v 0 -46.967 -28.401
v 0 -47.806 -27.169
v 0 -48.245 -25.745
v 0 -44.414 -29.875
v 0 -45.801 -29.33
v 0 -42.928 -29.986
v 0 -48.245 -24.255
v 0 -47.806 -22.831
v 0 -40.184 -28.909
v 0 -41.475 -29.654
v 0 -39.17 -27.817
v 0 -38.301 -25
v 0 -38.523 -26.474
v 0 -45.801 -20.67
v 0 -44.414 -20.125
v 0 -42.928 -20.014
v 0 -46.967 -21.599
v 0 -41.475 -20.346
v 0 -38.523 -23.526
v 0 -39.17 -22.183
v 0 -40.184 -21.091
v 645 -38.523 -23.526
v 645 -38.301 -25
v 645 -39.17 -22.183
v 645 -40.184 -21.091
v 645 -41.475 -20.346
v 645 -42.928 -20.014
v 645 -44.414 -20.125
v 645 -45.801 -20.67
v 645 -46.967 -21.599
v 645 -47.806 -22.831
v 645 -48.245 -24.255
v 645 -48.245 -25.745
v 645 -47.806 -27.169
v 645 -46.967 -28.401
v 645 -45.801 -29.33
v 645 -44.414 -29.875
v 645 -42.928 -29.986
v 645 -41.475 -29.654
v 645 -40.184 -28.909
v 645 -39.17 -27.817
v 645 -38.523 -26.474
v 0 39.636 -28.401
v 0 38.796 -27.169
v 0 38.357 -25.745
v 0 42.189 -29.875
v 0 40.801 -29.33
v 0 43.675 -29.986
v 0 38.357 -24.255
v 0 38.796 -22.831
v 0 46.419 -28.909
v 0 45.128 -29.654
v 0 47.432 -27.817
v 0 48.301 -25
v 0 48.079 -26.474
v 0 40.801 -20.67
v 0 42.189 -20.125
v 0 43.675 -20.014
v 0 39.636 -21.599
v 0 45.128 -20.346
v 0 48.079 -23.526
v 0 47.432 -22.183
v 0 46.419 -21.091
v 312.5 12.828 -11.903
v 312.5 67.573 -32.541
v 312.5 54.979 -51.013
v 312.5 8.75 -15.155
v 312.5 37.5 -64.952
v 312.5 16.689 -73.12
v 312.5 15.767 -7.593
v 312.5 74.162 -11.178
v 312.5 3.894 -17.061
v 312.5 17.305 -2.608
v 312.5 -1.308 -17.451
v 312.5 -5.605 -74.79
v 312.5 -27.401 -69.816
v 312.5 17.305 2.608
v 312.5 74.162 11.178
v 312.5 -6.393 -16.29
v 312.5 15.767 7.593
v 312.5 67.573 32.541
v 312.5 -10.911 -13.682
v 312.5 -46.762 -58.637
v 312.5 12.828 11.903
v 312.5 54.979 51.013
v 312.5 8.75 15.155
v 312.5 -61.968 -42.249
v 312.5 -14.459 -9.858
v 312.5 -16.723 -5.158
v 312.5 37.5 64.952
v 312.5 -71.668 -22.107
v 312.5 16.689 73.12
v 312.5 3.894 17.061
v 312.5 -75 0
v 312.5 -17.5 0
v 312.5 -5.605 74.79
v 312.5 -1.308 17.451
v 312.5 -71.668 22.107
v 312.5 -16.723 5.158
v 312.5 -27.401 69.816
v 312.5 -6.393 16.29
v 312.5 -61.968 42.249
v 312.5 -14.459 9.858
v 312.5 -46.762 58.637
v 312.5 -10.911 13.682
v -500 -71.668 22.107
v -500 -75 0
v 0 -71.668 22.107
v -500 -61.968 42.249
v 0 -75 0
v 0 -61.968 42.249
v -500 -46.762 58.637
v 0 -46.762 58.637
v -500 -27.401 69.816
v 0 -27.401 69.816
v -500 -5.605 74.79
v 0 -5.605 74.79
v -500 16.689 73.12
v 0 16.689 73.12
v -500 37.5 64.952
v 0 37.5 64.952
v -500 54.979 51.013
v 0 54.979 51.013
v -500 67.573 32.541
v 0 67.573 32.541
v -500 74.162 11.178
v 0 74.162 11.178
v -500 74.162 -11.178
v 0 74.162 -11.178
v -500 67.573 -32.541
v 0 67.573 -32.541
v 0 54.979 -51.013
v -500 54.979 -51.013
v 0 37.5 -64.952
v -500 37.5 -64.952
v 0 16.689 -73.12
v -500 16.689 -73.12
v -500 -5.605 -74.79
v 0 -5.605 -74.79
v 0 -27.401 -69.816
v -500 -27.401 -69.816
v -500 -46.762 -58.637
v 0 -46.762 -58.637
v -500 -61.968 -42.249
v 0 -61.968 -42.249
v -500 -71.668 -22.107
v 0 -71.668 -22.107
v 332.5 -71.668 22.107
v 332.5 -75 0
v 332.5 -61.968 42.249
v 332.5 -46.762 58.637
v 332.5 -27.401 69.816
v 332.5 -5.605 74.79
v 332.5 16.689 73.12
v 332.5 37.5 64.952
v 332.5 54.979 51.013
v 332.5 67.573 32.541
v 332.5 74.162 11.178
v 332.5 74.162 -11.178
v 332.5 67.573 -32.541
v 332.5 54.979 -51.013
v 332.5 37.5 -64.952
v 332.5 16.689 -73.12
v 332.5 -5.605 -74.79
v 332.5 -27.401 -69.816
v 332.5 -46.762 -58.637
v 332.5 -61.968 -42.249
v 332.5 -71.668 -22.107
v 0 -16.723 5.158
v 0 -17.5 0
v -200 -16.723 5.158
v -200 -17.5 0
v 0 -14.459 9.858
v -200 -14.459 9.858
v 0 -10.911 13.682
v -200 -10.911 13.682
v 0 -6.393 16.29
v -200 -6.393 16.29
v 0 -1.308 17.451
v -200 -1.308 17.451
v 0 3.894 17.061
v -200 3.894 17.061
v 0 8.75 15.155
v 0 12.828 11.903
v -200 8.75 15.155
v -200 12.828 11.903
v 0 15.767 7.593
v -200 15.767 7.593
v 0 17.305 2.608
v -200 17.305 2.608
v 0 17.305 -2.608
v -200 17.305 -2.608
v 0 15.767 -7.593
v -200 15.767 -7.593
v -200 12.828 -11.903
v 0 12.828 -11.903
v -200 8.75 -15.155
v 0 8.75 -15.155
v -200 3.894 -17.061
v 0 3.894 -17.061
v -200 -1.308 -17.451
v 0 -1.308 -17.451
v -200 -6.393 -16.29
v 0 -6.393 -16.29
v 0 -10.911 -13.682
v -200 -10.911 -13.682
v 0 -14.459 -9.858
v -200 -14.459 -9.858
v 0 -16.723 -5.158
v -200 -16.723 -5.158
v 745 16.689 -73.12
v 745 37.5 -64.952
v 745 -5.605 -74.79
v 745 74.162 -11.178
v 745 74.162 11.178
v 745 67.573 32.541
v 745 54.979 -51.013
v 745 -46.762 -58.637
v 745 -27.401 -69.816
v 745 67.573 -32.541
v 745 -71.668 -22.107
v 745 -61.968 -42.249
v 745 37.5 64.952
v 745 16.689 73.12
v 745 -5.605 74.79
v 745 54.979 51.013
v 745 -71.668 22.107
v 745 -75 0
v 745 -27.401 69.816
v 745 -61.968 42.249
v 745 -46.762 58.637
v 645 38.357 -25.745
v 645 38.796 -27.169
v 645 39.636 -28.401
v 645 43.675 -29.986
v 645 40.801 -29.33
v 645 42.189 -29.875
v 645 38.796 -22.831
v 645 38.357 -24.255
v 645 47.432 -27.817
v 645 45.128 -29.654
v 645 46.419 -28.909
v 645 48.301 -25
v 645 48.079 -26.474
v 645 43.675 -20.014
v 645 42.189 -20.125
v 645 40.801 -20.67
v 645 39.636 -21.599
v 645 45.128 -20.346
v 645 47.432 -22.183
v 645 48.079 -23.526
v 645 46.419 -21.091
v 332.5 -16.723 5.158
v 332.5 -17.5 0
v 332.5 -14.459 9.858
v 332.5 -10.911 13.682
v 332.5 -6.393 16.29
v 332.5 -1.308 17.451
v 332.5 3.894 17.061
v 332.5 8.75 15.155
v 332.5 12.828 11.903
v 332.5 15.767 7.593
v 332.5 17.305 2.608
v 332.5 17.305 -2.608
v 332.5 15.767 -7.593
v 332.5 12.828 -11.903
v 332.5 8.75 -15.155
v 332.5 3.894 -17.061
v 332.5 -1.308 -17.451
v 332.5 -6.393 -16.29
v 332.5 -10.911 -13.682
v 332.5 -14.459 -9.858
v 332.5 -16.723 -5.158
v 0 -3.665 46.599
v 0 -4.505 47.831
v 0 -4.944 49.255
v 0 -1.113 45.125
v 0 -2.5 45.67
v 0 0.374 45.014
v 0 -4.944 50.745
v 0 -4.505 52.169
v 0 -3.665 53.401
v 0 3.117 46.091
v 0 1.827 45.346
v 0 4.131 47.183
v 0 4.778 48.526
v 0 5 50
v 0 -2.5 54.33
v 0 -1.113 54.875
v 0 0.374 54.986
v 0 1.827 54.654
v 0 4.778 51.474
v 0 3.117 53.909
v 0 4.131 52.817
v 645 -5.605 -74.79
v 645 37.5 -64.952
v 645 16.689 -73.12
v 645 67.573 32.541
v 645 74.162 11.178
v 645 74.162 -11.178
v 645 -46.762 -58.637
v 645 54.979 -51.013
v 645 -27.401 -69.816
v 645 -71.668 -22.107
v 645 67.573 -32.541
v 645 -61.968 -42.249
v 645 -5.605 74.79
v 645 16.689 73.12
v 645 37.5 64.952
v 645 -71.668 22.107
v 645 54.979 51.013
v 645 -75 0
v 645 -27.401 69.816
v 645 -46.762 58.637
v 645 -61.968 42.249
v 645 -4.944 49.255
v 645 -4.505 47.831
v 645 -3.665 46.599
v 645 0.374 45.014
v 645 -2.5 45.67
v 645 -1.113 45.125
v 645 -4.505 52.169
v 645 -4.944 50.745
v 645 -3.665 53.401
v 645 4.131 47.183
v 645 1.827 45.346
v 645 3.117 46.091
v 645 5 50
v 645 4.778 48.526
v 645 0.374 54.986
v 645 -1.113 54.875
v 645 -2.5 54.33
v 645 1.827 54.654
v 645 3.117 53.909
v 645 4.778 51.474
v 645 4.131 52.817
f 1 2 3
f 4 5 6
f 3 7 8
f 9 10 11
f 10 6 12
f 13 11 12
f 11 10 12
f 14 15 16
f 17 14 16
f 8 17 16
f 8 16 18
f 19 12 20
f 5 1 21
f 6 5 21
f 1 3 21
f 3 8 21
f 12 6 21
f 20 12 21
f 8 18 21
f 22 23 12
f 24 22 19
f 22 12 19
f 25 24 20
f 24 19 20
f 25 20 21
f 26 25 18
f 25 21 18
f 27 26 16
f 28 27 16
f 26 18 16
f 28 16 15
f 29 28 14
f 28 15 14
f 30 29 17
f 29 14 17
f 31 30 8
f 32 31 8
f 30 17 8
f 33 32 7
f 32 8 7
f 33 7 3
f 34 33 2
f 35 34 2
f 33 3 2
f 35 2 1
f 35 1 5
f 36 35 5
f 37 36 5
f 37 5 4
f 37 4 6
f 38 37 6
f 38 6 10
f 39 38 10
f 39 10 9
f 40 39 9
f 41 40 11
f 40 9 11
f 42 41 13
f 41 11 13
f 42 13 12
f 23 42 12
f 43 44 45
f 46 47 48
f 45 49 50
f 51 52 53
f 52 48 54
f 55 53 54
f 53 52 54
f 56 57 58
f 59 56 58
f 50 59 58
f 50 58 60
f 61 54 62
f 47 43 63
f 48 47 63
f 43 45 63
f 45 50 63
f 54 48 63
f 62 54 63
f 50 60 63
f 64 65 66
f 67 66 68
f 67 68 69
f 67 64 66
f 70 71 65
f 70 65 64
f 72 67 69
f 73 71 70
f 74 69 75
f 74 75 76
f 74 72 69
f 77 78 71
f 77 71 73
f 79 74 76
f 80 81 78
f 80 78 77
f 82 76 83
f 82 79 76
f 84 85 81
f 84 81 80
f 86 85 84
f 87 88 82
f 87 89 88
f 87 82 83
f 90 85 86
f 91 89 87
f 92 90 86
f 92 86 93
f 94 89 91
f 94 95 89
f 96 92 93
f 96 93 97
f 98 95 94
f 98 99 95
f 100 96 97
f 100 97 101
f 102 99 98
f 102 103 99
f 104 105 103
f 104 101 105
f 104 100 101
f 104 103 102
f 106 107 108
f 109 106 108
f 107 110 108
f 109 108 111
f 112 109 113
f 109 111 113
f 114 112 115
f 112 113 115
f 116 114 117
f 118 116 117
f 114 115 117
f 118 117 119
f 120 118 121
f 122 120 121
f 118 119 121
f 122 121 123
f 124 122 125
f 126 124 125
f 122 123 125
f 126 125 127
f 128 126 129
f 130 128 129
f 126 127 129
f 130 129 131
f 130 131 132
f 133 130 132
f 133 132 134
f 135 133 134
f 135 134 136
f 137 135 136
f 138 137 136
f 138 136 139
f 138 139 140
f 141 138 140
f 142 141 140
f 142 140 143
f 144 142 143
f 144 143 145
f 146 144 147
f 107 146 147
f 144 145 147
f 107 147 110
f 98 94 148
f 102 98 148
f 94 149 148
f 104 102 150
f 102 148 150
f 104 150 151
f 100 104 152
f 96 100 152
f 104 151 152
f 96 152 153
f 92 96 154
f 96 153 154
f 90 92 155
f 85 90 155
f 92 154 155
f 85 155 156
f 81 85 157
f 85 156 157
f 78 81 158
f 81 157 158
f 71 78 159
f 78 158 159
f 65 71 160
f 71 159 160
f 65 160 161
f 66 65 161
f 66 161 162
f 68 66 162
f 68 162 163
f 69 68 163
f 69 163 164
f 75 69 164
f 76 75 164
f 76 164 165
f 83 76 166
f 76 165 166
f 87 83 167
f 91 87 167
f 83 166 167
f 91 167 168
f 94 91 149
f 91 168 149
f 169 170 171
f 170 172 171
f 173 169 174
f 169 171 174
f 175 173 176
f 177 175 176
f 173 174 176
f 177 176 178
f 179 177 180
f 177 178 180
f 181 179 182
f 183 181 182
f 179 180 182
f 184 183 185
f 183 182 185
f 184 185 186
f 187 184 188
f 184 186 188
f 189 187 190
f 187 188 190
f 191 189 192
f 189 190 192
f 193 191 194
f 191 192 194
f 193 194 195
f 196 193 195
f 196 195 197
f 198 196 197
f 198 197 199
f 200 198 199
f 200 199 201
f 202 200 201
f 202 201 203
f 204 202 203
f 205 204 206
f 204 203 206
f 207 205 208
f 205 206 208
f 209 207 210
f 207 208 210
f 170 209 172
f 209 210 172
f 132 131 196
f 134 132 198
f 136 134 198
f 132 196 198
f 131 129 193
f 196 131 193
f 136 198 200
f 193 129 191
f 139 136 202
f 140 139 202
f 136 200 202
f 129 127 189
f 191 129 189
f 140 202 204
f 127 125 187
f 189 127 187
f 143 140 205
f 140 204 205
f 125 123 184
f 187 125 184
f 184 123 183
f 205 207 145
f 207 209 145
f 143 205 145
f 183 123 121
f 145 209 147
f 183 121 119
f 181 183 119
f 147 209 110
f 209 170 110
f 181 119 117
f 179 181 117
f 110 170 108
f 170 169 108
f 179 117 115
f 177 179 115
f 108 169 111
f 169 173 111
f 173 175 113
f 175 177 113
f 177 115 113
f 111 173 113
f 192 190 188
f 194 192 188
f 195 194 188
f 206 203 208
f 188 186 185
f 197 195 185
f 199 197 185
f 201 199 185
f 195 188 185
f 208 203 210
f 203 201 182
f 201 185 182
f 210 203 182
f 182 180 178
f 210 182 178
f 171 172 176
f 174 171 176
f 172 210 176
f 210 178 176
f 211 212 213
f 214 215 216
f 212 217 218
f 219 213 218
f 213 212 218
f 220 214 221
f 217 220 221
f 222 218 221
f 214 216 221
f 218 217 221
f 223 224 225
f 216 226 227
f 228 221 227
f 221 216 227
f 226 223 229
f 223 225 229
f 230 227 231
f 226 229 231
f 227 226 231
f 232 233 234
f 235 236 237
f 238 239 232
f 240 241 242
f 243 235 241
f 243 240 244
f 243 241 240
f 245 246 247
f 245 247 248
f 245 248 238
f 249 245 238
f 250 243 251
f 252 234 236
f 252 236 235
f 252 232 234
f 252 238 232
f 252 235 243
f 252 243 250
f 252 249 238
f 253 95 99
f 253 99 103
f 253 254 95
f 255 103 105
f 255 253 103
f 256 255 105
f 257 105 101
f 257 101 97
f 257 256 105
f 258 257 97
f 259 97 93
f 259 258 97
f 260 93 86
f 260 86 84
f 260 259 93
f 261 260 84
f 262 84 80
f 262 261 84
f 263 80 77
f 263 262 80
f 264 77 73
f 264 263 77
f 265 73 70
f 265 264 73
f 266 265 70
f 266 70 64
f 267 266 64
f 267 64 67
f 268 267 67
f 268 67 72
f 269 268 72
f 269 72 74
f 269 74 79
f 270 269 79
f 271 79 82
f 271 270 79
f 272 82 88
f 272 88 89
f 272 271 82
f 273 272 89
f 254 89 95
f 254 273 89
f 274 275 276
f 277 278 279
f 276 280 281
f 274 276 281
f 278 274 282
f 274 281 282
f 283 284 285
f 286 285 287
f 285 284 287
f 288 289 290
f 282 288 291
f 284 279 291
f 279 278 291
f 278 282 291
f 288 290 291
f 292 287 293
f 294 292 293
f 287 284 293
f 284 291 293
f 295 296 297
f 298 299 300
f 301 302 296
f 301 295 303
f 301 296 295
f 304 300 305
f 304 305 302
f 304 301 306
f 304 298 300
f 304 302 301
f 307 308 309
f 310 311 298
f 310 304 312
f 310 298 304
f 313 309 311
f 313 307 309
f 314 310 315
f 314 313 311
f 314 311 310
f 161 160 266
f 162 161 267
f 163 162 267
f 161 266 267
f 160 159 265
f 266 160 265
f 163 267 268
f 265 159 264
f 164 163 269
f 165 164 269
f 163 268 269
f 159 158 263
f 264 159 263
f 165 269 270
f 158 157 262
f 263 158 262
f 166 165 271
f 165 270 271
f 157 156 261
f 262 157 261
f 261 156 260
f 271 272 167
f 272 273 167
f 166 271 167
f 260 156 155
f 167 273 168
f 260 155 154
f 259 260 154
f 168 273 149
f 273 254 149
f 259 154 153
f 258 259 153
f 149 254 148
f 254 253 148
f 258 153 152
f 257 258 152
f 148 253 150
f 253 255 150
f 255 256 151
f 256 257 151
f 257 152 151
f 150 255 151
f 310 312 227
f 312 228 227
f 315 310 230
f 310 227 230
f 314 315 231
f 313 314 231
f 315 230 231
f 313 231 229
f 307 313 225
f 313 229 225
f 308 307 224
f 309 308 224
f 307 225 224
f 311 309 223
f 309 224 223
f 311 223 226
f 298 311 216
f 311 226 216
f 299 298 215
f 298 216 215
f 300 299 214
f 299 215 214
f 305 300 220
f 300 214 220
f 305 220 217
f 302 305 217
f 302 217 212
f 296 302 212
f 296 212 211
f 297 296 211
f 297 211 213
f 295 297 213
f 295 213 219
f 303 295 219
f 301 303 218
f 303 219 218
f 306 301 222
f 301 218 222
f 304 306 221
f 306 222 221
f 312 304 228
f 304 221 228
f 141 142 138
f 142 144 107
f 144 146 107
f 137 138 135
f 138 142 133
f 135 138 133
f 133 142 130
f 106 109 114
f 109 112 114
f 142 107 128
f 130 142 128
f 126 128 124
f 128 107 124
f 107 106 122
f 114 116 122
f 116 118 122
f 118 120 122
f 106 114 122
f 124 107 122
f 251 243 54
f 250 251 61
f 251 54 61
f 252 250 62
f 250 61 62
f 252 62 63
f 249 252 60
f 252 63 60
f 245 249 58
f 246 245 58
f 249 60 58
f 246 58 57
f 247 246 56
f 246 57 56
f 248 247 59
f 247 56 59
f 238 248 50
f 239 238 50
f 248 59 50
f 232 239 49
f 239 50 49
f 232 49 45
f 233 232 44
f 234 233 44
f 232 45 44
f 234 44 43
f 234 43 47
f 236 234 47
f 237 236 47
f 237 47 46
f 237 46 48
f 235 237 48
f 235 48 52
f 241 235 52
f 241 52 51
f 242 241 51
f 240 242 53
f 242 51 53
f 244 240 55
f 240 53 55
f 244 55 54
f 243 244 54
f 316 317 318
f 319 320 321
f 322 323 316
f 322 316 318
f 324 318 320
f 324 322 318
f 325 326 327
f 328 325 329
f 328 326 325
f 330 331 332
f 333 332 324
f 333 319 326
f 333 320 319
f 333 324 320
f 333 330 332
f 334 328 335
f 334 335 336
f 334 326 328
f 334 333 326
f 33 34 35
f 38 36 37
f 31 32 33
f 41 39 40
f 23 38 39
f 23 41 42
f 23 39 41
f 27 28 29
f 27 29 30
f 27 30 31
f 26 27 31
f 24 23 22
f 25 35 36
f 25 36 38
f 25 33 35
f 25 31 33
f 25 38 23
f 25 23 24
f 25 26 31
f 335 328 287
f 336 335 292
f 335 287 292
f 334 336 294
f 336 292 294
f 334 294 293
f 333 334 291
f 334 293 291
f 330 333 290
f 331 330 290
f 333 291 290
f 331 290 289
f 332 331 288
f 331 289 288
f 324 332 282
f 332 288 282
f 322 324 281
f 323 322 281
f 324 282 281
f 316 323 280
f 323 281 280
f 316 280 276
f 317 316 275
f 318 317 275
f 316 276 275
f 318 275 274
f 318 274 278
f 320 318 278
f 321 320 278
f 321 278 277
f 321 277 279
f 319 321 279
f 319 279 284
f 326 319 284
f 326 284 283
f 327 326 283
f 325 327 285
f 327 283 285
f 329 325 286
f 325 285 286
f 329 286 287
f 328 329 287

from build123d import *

# Parameters (mm, degrees)
F2_W     = 20
F2_H     = 57.5
F1_W     = 100
F1_H     = 75
F4_R     = 5
F5_DEPTH = 645


# Not quite as in the source:
# - a feature names something its author has since deleted; it is built from what else it names


with BuildPart() as f3:
    # F0 (on Top) → F3 (revolve)
    with BuildSketch(Plane.XY):
        Polygon((-200, 0), (-500, 0), (-500, -75), (0, -75), (0, -17.5), (-200, -17.5), align=None)
    revolve(axis=Axis((-350, 0, 0), (-1, 0, 0)))


with BuildPart() as f3b:
    # F2 (on Top) → F3, piece 2 (revolve)
    with BuildSketch(Plane.XY):
        with Locations((322.5, -46.25)):
            Rectangle(F2_W, F2_H)
    revolve(axis=Axis((-350, 0, 0), (-1, 0, 0)))


with BuildPart() as f3c:
    # F1 (on Top) → F3, piece 3 (revolve)
    with BuildSketch(Plane.XY):
        with Locations((695, -37.5)):
            Rectangle(F1_W, F1_H)
    revolve(axis=Axis((-350, 0, 0), (-1, 0, 0)))


with BuildPart() as f5:
    # F4 (on Right) → F5 (new body, through all)
    with BuildSketch(Plane.YZ):
        with Locations((0, 50)):
            Circle(F4_R)
    extrude(amount=F5_DEPTH)


with BuildPart() as f5b:
    # F4 (on Right) → F5, piece 2 (new body, through all)
    with BuildSketch(Plane.YZ):
        with Locations((-43.3012701892, -25)):
            Circle(F4_R)
    extrude(amount=F5_DEPTH)


with BuildPart() as f5c:
    # F4 (on Right) → F5, piece 3 (new body, through all)
    with BuildSketch(Plane.YZ):
        with Locations((43.3012701892, -25)):
            Circle(F4_R)
    extrude(amount=F5_DEPTH)


solid = Compound([f3.part, f3b.part, f3c.part, f5.part, f5b.part, f5c.part])
